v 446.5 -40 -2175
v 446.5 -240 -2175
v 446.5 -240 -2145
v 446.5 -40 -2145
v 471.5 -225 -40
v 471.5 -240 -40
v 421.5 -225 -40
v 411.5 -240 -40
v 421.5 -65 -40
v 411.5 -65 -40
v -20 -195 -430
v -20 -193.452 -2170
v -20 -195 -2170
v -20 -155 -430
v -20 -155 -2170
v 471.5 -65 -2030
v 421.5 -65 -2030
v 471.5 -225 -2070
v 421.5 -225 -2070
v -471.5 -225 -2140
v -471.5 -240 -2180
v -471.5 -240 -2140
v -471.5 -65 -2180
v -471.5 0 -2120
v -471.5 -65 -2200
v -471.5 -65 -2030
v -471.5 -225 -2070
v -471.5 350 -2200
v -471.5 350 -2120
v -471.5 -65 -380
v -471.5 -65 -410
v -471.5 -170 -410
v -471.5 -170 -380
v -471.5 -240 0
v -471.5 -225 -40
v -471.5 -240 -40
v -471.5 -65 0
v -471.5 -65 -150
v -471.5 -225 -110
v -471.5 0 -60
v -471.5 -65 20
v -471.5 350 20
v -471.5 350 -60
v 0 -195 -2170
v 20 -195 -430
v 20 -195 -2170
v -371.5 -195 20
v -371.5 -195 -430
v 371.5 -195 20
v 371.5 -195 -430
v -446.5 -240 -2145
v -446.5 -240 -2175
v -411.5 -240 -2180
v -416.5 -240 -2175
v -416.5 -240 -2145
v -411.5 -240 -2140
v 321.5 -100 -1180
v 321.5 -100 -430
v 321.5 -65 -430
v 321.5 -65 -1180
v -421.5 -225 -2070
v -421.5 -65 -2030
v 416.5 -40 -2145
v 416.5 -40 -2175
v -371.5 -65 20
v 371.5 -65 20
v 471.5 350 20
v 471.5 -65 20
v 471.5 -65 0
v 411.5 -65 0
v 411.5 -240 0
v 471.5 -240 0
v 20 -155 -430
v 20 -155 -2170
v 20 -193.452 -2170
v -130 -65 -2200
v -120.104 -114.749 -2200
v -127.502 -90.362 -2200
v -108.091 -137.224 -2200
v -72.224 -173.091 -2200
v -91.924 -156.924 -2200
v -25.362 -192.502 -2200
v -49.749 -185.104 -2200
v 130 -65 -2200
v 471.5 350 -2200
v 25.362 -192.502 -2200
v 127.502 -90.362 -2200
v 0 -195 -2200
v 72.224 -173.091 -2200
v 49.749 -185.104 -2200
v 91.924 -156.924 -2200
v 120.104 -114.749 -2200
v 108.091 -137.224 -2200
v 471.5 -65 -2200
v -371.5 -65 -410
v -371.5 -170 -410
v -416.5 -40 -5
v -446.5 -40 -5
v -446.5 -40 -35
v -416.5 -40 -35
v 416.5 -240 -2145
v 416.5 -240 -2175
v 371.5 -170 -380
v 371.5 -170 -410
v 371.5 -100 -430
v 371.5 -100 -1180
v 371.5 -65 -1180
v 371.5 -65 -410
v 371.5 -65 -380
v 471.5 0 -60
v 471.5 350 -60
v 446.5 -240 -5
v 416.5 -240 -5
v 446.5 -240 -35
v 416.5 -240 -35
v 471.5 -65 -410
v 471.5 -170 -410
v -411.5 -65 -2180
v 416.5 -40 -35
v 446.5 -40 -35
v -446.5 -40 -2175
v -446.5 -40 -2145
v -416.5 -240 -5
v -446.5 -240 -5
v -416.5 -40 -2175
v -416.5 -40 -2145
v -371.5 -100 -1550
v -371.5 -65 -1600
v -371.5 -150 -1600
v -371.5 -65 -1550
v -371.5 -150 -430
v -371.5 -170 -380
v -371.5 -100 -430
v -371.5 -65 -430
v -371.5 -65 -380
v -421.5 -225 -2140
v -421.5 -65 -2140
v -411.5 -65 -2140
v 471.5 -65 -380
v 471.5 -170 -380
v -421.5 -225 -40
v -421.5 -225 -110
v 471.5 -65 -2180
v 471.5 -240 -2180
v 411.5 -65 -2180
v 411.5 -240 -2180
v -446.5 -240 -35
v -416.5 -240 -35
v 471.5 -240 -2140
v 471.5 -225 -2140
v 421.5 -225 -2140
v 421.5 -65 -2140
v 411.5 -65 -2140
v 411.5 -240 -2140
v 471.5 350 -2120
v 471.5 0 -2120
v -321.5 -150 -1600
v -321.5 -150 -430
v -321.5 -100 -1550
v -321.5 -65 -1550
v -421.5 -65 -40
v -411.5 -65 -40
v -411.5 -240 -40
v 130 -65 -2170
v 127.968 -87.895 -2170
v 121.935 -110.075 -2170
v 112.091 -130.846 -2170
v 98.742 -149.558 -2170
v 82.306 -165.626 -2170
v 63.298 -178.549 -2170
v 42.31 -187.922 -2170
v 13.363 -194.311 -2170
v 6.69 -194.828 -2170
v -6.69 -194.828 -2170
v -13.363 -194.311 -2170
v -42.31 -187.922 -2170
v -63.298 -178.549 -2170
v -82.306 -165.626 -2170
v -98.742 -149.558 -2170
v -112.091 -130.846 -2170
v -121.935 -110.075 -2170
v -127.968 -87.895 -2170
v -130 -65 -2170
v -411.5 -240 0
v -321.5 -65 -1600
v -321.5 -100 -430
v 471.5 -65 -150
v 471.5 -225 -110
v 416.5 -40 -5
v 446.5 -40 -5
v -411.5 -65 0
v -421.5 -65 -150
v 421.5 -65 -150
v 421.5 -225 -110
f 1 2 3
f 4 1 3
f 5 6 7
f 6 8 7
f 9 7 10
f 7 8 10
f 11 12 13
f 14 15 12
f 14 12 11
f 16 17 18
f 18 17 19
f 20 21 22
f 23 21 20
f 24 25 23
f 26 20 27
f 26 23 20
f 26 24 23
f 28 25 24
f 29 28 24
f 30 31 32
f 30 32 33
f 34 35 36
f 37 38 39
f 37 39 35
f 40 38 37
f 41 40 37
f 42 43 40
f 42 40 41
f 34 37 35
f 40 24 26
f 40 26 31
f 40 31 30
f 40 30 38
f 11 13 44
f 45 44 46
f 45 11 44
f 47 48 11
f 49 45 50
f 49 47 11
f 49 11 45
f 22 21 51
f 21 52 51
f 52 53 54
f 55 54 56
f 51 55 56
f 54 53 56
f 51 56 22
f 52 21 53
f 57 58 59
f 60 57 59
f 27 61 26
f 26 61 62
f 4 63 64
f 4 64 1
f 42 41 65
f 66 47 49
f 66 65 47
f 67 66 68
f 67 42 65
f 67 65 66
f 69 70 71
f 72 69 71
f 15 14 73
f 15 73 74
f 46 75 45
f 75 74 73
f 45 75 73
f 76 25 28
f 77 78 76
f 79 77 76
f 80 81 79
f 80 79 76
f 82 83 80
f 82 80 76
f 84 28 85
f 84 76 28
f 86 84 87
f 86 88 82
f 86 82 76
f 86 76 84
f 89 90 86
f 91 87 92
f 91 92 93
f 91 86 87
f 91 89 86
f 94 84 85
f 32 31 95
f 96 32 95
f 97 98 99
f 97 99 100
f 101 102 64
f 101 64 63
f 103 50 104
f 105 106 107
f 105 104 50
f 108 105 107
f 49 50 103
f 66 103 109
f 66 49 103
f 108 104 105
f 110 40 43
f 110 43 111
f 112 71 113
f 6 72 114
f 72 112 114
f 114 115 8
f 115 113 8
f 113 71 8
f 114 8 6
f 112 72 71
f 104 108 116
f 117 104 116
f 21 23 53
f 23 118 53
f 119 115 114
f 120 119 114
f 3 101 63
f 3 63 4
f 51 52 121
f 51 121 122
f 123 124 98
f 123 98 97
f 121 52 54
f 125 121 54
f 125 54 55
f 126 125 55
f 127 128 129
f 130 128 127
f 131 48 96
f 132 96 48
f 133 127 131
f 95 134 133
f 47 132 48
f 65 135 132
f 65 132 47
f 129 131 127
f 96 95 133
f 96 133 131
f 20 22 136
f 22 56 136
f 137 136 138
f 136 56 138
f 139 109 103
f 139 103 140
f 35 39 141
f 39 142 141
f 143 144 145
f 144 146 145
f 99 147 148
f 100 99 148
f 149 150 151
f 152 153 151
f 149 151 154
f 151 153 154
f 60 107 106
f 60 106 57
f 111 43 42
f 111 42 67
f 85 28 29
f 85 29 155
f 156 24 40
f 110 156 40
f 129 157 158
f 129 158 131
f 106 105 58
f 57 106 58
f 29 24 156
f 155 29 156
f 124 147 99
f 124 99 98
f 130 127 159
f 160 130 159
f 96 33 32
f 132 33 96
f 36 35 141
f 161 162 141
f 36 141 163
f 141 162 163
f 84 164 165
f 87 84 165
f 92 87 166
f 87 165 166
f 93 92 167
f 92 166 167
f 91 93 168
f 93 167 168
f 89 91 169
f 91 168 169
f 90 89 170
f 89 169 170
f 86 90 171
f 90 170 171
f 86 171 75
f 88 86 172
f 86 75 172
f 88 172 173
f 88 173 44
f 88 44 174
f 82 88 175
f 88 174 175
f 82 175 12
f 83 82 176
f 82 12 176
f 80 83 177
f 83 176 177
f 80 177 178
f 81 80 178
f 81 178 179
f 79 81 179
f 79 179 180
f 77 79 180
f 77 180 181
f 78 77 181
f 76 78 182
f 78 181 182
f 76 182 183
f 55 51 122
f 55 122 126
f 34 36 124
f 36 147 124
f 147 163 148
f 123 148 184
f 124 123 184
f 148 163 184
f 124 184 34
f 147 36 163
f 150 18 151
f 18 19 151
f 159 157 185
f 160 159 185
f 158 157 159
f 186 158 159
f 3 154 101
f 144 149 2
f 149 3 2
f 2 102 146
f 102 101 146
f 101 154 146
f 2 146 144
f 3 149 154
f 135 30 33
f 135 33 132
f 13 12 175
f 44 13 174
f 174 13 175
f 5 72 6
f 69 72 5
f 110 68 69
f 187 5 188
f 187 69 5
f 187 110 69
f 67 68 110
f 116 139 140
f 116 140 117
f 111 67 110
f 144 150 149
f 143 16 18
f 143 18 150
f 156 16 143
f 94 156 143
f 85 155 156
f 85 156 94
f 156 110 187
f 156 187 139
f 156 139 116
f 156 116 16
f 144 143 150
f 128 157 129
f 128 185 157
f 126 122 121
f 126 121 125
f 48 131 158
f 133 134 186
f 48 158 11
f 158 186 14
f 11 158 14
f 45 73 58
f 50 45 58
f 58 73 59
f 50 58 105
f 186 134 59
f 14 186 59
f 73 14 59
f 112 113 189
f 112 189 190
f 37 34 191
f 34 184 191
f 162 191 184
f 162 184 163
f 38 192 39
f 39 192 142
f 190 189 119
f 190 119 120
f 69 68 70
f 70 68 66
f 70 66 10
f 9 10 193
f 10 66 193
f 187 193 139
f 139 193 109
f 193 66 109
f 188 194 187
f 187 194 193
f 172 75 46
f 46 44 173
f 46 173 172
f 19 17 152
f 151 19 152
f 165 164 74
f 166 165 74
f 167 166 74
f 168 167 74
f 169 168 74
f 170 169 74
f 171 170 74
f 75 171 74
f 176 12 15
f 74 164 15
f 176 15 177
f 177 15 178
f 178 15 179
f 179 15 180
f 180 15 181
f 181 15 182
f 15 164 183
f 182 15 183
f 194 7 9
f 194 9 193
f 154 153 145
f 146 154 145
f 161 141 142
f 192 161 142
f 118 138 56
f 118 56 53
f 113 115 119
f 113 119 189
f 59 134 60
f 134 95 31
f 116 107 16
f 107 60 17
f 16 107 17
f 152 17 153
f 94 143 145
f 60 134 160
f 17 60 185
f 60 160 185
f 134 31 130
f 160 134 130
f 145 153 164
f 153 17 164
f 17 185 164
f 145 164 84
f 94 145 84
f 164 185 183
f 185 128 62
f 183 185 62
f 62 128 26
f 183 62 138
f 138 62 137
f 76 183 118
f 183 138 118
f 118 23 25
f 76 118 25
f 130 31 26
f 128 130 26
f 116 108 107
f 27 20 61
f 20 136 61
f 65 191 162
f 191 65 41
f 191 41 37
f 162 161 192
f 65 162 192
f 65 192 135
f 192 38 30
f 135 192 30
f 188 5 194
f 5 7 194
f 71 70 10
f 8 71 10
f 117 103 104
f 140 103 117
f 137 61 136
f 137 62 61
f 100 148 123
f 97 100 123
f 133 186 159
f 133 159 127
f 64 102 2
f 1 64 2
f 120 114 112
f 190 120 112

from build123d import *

# Parameters (mm, degrees)
SKETCH1_W                = 40
SKETCH1_H                = 40
SKETCH1_H_2              = 10
SKETCH1_W_2              = 903
SKETCH1_H_3              = 2060
BOSS_EXTRUDE1_DEPTH      = 65
BOSS_EXTRUDE2_DEPTH      = 350
BOSS_EXTRUDE2_DEPTH_BACK = 50
SKETCH1_3_W              = 943
SKETCH1_3_H              = 80
SKETCH1_4_W              = 40
SKETCH1_4_H              = 40
BOSS_EXTRUDE3_DEPTH      = 240
BOSS_EXTRUDE4_DEPTH      = 30
BOSS_EXTRUDE5_DEPTH      = 30
SKETCH5_W                = 30
SKETCH5_H                = 30
CUT_EXTRUDE1_DEPTH       = 200
BOSS_EXTRUDE6_DEPTH      = 30
BOSS_EXTRUDE7_START      = -30
BOSS_EXTRUDE7_DEPTH      = 30
BOSS_EXTRUDE8_DEPTH      = 20
BOSS_EXTRUDE8_DEPTH_BACK = 20
SKETCH8_W                = 743
SKETCH8_H                = 450
BOSS_EXTRUDE9_DEPTH      = 130
SKETCH9_W                = 50
SKETCH9_H                = 50
BOSS_EXTRUDE11_DEPTH     = 750
SKETCH9_3_W              = 50
SKETCH9_3_H              = 50
BOSS_EXTRUDE12_DEPTH     = 1170
SKETCH10_W               = 50
SKETCH10_H               = 50
BOSS_EXTRUDE13_DEPTH     = 85
BOSS_EXTRUDE14_DEPTH     = 20
BOSS_EXTRUDE15_DEPTH     = 20
SKETCH14_W               = 943
SKETCH14_H               = 30
BOSS_EXTRUDE16_DEPTH     = 105


with BuildPart() as part:
    # Sketch1 → Boss-Extrude1 (new body)
    with BuildSketch(Plane(origin=(0, 0, 0), x_dir=(1, 0, 0), z_dir=(0, 1, 0))):
        with Locations((-431.5, 20)):
            Rectangle(SKETCH1_W, SKETCH1_H)
        Polygon((-411.5, 50), (-411.5, 40), (-411.5, 0), (411.5, 0), (411.5, 40), (411.5, 50), align=None)
        with Locations((-431.5, 45)):
            Rectangle(SKETCH1_W, SKETCH1_H_2)
        Polygon((-451.5, 0), (-451.5, 40), (-451.5, 50), (-451.5, 60), (-471.5, 60), (-471.5, -20), (471.5, -20), (471.5, 60), (451.5, 60), (451.5, 50), (451.5, 40), (451.5, 0), (411.5, 0), (-411.5, 0), align=None)
        Polygon((-451.5, 50), (-411.5, 50), (411.5, 50), (451.5, 50), (451.5, 60), (-451.5, 60), align=None)
        with Locations((431.5, 20)):
            Rectangle(SKETCH1_W, SKETCH1_H)
        with Locations((431.5, 45)):
            Rectangle(SKETCH1_W, SKETCH1_H_2)
        with Locations((0, 1090)):
            Rectangle(SKETCH1_W_2, SKETCH1_H_3)
        Polygon((-471.5, 2120), (-451.5, 2120), (-451.5, 2130), (-451.5, 2140), (-451.5, 2180), (-411.5, 2180), (411.5, 2180), (451.5, 2180), (451.5, 2140), (451.5, 2130), (451.5, 2120), (471.5, 2120), (471.5, 2200), (-471.5, 2200), align=None)
        Polygon((-451.5, 2130), (-451.5, 2120), (451.5, 2120), (451.5, 2130), (411.5, 2130), (-411.5, 2130), align=None)
        with Locations((-431.5, 2135)):
            Rectangle(SKETCH1_W, SKETCH1_H_2)
        with Locations((-431.5, 2160)):
            Rectangle(SKETCH1_W, SKETCH1_H)
        Polygon((-411.5, 2140), (-411.5, 2130), (411.5, 2130), (411.5, 2140), (411.5, 2180), (-411.5, 2180), align=None)
        with Locations((431.5, 2135)):
            Rectangle(SKETCH1_W, SKETCH1_H_2)
        with Locations((431.5, 2160)):
            Rectangle(SKETCH1_W, SKETCH1_H)
    extrude(amount=-BOSS_EXTRUDE1_DEPTH)

    # Sketch1<3> → Boss-Extrude2 (add, two sides: drawn at the far end of the back side and taken through both)
    with BuildSketch(Plane(origin=(0, 0, 0), x_dir=(1, 0, 0), z_dir=(0, 1, 0)).offset(-BOSS_EXTRUDE2_DEPTH_BACK)):
        with Locations((0, 2160)):
            Rectangle(SKETCH1_3_W, SKETCH1_3_H)
        with Locations((0, 20)):
            Rectangle(SKETCH1_3_W, SKETCH1_3_H)
    extrude(amount=BOSS_EXTRUDE2_DEPTH + BOSS_EXTRUDE2_DEPTH_BACK)

    # Sketch1<4> → Boss-Extrude3 (add)
    with BuildSketch(Plane(origin=(0, 0, 0), x_dir=(1, 0, 0), z_dir=(0, 1, 0))):
        with Locations((431.5, 2160)):
            Rectangle(SKETCH1_4_W, SKETCH1_4_H)
        with Locations((-431.5, 2160)):
            Rectangle(SKETCH1_4_W, SKETCH1_4_H)
        with Locations((-431.5, 20)):
            Rectangle(SKETCH1_4_W, SKETCH1_4_H)
        with Locations((431.5, 20)):
            Rectangle(SKETCH1_4_W, SKETCH1_4_H)
    extrude(amount=-BOSS_EXTRUDE3_DEPTH)

    # Sketch3 → Boss-Extrude4 (add)
    with BuildSketch(Plane(origin=(451.5, 0, 0), x_dir=(0, 0, -1), z_dir=(1, 0, 0))):
        Polygon((40, -65), (40, -225), (110, -225), (150, -65), align=None)
        Polygon((2140, -65), (2030, -65), (2070, -225), (2140, -225), align=None)
    extrude(amount=-BOSS_EXTRUDE4_DEPTH)

    # Sketch4 → Boss-Extrude5 (add)
    with BuildSketch(Plane(origin=(-451.5, 0, -45.75), x_dir=(0, 0, -1), z_dir=(1, 0, 0))):
        Polygon((2024.25, -225), (2094.25, -225), (2094.25, -65), (1984.25, -65), align=None)
        Polygon((64.25, -225), (104.25, -65), (-5.75, -65), (-5.75, -225), align=None)
    extrude(amount=BOSS_EXTRUDE5_DEPTH)

    # Sketch5 → Cut-Extrude1 (cut)
    with BuildSketch(Plane.XZ.offset(240)):
        with Locations((-431.5, -2160)):
            Rectangle(SKETCH5_W, SKETCH5_H)
        with Locations((431.5, -2160)):
            Rectangle(SKETCH5_W, SKETCH5_H)
        with Locations((431.5, -20)):
            Rectangle(SKETCH5_W, SKETCH5_H)
        with Locations((-431.5, -20)):
            Rectangle(SKETCH5_W, SKETCH5_H)
    extrude(amount=-CUT_EXTRUDE1_DEPTH, mode=Mode.SUBTRACT)

    # Sketch6 → Boss-Extrude6 (add)
    with BuildSketch(Plane.XY.offset(20)):
        with BuildLine():
            Line((130, -65), (-130, -65))
            ThreePointArc((-130, -65), (0, -195), (130, -65))
        make_face()
    extrude(amount=-BOSS_EXTRUDE6_DEPTH)

    # Sketch7 → Boss-Extrude7 (add)
    with BuildSketch(Plane(origin=(0, 0, -2200), x_dir=(-1, 0, 0), z_dir=(0, 0, -1)).offset(BOSS_EXTRUDE7_START)):
        with BuildLine():
            Line((130, -65), (-130, -65))
            ThreePointArc((-130, -65), (0, -195), (130, -65))
        make_face()
    extrude(amount=BOSS_EXTRUDE7_DEPTH)

    # 3DSketch1 → Boss-Extrude8 (add, two sides: drawn at the far end of the back side and taken through both)
    with BuildSketch(Plane(origin=(0, -195, -10), x_dir=(0, 0.018515344006020947, -0.9998285763251313), z_dir=(1, 0, 0)).offset(-BOSS_EXTRUDE8_DEPTH_BACK)):
        Polygon((0, 0), (0.74061376, 39.993143053), (2160.370338623, 0), (2159.629724862, -39.993143053), align=None)
    extrude(amount=BOSS_EXTRUDE8_DEPTH + BOSS_EXTRUDE8_DEPTH_BACK)

    # Sketch8 → Boss-Extrude9 (add)
    with BuildSketch(Plane.XZ.offset(65)):
        with Locations((0, -205)):
            Rectangle(SKETCH8_W, SKETCH8_H)
    extrude(amount=BOSS_EXTRUDE9_DEPTH)

    # Sketch9 → Boss-Extrude11 (add)
    with BuildSketch(Plane(origin=(0, 0, -430), x_dir=(-1, 0, 0), z_dir=(0, 0, -1))):
        with Locations((-346.5, -75)):
            Rectangle(SKETCH9_W, SKETCH9_H)
    extrude(amount=BOSS_EXTRUDE11_DEPTH)

    # Sketch9<3> → Boss-Extrude12 (add)
    with BuildSketch(Plane(origin=(0, 0, -430), x_dir=(-1, 0, 0), z_dir=(0, 0, -1))):
        with Locations((346.5, -125)):
            Rectangle(SKETCH9_3_W, SKETCH9_3_H)
    extrude(amount=BOSS_EXTRUDE12_DEPTH)

    # Sketch10 → Boss-Extrude13 (add)
    with BuildSketch(Plane.XZ.offset(150)):
        with Locations((-346.5, -1575)):
            Rectangle(SKETCH10_W, SKETCH10_H)
    extrude(amount=-BOSS_EXTRUDE13_DEPTH)

    # Sketch12 → Boss-Extrude14 (add)
    with BuildSketch(Plane.ZY.offset(451.5)):
        Polygon((-60, 0), (-2120, 0), (-2120, -65), (-2180, -65), (-2180, -240), (-2140, -240), (-2140, -225), (-2070, -225), (-2030, -65), (-150, -65), (-110, -225), (-40, -225), (-40, -240), (0, -240), (0, -65), (-60, -65), align=None)
    extrude(amount=BOSS_EXTRUDE14_DEPTH)

    # Sketch13 → Boss-Extrude15 (add)
    with BuildSketch(Plane(origin=(451.5, 0, 0), x_dir=(0, 0, -1), z_dir=(1, 0, 0))):
        Polygon((2120, 0), (60, 0), (60, -65), (0, -65), (0, -240), (40, -240), (40, -225), (110, -225), (150, -65), (2030, -65), (2070, -225), (2140, -225), (2140, -240), (2180, -240), (2180, -65), (2120, -65), align=None)
    extrude(amount=BOSS_EXTRUDE15_DEPTH)

    # Sketch14 → Boss-Extrude16 (add)
    with BuildSketch(Plane.XZ.offset(65)):
        with Locations((0, -395)):
            Rectangle(SKETCH14_W, SKETCH14_H)
    extrude(amount=BOSS_EXTRUDE16_DEPTH)


solid = part.part
